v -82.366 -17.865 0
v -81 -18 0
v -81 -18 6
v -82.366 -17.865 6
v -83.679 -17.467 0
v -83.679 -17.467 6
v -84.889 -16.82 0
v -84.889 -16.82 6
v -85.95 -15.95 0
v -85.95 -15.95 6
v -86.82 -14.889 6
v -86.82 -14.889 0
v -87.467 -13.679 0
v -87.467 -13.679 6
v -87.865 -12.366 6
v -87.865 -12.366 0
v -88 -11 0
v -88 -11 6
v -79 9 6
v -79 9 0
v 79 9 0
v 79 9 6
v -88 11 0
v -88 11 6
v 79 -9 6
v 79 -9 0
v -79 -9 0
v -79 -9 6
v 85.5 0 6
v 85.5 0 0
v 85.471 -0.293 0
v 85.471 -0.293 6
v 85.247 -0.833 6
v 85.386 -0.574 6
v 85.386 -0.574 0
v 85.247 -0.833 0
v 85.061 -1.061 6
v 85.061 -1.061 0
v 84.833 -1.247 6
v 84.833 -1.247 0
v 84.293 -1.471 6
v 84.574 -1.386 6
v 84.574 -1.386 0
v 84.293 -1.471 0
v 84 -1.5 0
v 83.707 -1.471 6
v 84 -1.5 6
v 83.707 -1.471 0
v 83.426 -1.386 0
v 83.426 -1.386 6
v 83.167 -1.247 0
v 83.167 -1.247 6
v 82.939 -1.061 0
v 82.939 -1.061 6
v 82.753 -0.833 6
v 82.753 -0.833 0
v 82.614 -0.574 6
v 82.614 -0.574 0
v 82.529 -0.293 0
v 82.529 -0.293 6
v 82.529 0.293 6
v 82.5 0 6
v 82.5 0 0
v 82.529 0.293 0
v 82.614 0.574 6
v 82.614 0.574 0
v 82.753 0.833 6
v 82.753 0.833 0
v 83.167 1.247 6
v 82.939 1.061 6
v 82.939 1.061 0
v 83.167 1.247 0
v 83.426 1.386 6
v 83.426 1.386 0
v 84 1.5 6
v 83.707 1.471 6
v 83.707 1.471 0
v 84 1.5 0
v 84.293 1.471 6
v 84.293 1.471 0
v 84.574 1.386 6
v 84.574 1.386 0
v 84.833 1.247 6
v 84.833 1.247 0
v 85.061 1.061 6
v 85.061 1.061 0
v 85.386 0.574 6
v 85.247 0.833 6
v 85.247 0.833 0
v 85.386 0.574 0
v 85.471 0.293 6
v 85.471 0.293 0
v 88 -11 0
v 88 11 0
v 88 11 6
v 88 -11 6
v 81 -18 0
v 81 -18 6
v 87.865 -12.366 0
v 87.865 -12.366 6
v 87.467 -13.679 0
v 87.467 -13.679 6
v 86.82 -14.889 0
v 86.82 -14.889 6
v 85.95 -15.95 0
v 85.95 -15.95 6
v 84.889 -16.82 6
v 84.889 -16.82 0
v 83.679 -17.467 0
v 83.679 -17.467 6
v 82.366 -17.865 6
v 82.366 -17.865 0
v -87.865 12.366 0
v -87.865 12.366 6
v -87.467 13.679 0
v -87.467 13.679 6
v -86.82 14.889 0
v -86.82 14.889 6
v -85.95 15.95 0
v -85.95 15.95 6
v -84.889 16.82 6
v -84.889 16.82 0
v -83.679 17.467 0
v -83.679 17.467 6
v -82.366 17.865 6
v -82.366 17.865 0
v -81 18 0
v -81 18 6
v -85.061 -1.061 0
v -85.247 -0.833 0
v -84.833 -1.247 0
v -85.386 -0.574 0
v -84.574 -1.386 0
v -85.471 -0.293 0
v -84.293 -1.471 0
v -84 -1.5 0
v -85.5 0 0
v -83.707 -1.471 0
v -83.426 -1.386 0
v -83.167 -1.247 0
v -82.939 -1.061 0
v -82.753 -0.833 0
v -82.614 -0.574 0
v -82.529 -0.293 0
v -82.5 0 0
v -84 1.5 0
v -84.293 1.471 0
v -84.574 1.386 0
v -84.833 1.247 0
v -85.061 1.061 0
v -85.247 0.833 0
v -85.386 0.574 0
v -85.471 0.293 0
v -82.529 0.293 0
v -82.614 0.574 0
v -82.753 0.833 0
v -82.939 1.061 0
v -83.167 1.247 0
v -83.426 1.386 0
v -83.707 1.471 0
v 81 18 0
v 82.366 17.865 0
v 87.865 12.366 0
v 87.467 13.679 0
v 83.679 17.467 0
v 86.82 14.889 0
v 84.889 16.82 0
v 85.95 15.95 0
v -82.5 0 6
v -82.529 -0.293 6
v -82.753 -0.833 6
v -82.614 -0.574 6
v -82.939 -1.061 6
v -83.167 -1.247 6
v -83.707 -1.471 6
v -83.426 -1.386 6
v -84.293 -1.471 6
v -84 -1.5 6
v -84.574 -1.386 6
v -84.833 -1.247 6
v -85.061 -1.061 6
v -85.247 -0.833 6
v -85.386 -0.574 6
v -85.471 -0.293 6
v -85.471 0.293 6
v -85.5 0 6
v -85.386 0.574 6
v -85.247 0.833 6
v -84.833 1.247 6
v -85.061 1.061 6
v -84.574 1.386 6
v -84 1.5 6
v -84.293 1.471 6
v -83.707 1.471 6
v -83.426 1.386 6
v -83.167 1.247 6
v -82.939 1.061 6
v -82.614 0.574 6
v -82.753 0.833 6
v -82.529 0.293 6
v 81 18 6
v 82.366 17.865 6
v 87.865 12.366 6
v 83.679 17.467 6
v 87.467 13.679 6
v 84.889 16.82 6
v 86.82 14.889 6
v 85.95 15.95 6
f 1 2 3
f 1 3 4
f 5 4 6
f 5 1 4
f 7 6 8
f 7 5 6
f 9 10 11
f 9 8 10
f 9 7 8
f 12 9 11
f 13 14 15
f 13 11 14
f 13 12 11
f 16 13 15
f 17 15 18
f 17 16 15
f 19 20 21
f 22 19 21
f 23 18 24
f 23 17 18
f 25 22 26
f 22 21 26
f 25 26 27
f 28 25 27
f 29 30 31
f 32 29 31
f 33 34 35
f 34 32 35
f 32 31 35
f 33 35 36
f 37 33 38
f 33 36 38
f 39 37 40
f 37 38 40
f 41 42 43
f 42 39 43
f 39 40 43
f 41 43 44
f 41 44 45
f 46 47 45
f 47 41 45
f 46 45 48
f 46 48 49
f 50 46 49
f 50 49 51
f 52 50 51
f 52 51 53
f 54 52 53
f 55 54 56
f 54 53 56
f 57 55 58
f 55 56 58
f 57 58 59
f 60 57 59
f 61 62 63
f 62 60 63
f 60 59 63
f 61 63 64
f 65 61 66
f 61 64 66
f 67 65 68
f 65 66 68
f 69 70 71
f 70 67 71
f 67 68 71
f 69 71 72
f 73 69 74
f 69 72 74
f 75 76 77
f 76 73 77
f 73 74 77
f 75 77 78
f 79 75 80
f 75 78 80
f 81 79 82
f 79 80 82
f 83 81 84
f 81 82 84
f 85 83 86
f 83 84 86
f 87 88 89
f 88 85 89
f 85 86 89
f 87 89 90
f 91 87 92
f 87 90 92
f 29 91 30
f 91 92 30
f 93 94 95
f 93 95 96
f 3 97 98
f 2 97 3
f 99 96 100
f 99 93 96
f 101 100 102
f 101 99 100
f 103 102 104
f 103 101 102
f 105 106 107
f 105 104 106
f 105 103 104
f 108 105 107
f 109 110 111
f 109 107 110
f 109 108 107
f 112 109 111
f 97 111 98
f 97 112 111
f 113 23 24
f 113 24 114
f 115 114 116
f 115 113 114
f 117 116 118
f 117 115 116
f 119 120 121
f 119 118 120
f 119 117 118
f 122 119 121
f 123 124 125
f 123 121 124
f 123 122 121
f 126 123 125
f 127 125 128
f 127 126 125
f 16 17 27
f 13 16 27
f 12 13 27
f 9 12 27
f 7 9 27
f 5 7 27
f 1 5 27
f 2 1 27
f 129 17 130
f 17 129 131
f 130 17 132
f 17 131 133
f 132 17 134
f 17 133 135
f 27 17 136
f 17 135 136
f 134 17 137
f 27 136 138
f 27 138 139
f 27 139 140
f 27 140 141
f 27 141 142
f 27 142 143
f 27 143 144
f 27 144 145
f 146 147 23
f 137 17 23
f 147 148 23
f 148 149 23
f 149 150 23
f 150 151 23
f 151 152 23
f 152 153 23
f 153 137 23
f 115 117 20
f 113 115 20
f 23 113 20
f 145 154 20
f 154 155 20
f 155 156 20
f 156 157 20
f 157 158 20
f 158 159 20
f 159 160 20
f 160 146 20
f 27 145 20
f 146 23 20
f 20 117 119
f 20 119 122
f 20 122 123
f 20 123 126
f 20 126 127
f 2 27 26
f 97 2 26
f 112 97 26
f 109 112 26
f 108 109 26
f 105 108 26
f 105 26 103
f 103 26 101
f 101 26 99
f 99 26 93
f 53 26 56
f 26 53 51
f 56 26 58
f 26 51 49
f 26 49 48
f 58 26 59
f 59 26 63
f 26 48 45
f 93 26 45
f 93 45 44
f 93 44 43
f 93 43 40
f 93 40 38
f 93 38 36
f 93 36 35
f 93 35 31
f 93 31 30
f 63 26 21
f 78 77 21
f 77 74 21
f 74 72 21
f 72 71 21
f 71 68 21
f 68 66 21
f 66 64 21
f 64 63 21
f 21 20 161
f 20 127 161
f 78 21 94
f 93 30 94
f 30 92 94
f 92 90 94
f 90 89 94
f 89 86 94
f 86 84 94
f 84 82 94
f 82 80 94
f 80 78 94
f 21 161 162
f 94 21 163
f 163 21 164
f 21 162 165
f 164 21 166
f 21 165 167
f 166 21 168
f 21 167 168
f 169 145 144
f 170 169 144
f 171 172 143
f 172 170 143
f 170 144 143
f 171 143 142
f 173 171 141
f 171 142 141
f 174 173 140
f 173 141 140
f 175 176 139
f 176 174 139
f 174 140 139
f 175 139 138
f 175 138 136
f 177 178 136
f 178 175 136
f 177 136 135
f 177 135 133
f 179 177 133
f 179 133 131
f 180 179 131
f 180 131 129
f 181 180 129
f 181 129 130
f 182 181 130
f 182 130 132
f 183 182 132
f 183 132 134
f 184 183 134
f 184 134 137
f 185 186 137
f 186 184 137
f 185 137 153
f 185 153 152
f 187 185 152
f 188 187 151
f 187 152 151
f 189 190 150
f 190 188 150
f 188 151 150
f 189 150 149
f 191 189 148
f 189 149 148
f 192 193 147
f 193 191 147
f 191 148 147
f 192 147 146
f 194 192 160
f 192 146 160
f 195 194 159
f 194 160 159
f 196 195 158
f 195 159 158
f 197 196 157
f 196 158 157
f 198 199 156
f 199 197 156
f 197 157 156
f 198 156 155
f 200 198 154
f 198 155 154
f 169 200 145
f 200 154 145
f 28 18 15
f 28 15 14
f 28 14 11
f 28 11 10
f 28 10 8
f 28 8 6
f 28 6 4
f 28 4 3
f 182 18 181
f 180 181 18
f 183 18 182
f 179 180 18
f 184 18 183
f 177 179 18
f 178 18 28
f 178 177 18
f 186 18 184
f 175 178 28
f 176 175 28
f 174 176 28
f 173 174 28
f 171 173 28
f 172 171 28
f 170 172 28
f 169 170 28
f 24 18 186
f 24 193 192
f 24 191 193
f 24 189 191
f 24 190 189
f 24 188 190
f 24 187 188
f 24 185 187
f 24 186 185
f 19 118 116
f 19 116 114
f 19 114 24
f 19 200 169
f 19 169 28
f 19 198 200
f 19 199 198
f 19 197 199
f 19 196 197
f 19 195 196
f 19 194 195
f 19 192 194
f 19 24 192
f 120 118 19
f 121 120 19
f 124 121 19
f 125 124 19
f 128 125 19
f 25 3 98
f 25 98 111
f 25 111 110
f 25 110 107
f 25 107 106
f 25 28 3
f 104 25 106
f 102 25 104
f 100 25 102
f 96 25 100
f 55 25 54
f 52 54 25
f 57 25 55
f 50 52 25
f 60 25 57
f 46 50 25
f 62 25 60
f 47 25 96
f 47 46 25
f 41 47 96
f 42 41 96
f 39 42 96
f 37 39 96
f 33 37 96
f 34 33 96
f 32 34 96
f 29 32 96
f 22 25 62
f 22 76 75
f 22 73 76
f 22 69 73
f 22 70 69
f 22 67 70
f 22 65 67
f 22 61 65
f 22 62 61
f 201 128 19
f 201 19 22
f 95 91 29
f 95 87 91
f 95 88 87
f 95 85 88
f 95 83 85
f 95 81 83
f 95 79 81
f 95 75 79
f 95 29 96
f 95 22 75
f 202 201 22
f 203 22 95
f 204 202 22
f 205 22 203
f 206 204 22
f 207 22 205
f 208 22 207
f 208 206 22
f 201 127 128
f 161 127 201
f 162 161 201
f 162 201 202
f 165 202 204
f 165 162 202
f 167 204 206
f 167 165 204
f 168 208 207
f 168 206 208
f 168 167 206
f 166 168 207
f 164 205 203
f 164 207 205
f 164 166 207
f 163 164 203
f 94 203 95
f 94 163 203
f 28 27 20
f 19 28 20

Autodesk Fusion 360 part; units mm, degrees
sketch "Sketch1" plane through (0, 0, 0) normal (0, 0, 1) x (1, 0, 0)
  line L0 (-79, 9) -> (79, 9)
  line L1 (79, 9) -> (79, -9)
  line L2 (79, -9) -> (-79, -9)
  line L3 (-79, -9) -> (-79, 9)
  line L4 (-79, 9) -> (79, -9) construction
  line L5 (79, 9) -> (-79, -9) construction
  line L6 (-81, 18) -> (81, 18)
  line L7 (88, 11) -> (88, -11)
  line L8 (81, -18) -> (-81, -18)
  line L9 (-88, -11) -> (-88, 11)
  line L10 (-88, 18) -> (88, -18) construction
  line L11 (88, 18) -> (-88, -18) construction
  arc A0 (-81, 18) -> (-88, 11) centre (-81, 11) ccw
  arc A1 (-88, -11) -> (-81, -18) centre (-81, -11) ccw
  arc A2 (81, -18) -> (88, -11) centre (81, -11) ccw
  arc A3 (88, 11) -> (81, 18) centre (81, 11) ccw
  line L12 (0, 0) -> (27, 0) construction
  circle A4 centre (-84, 0) radius 1.5
  line L13 (0, 0) -> (0, 18) construction
  circle A5 centre (84, 0) radius 1.5
  dimension "d22" = 158
  dimension "d23" = 18
  dimension "d28" = 176
  dimension "d29" = 36
  dimension "d30" = 7
  dimension "d35" = 3
  dimension "d37" = 18
  dimension "d54" = 5
extrude "Extrude7" add sketch "Sketch1" along normal blind 6
sketch "Sketch3" plane through (0, 0, 3) normal (0, 0, 1) x (-1, 0, 0)
  circle A0 centre (0, -13) radius 1.5
  circle A1 centre (-85, 0) radius 1.5
  circle A2 centre (0, 13) radius 1.5
  circle A3 centre (85, 0) radius 1.5
  line L0 (-79, 9) -> (79, 9)
  line L1 (79, 9) -> (79, -9)
  line L2 (79, -9) -> (-79, -9)
  line L3 (-79, -9) -> (-79, 9)
  arc A4 (-83, 18) -> (-90, 11) centre (-83, 11) ccw
  line L4 (-90, 11) -> (-90, -11)
  arc A5 (-90, -11) -> (-83, -18) centre (-83, -11) ccw
  line L5 (-83, -18) -> (83, -18)
  arc A6 (83, -18) -> (90, -11) centre (83, -11) ccw
  line L6 (90, -11) -> (90, 11)
  arc A7 (90, 11) -> (83, 18) centre (83, 11) ccw
  line L7 (83, 18) -> (-83, 18)
  circle A8 centre (0, 13) radius 1.5
